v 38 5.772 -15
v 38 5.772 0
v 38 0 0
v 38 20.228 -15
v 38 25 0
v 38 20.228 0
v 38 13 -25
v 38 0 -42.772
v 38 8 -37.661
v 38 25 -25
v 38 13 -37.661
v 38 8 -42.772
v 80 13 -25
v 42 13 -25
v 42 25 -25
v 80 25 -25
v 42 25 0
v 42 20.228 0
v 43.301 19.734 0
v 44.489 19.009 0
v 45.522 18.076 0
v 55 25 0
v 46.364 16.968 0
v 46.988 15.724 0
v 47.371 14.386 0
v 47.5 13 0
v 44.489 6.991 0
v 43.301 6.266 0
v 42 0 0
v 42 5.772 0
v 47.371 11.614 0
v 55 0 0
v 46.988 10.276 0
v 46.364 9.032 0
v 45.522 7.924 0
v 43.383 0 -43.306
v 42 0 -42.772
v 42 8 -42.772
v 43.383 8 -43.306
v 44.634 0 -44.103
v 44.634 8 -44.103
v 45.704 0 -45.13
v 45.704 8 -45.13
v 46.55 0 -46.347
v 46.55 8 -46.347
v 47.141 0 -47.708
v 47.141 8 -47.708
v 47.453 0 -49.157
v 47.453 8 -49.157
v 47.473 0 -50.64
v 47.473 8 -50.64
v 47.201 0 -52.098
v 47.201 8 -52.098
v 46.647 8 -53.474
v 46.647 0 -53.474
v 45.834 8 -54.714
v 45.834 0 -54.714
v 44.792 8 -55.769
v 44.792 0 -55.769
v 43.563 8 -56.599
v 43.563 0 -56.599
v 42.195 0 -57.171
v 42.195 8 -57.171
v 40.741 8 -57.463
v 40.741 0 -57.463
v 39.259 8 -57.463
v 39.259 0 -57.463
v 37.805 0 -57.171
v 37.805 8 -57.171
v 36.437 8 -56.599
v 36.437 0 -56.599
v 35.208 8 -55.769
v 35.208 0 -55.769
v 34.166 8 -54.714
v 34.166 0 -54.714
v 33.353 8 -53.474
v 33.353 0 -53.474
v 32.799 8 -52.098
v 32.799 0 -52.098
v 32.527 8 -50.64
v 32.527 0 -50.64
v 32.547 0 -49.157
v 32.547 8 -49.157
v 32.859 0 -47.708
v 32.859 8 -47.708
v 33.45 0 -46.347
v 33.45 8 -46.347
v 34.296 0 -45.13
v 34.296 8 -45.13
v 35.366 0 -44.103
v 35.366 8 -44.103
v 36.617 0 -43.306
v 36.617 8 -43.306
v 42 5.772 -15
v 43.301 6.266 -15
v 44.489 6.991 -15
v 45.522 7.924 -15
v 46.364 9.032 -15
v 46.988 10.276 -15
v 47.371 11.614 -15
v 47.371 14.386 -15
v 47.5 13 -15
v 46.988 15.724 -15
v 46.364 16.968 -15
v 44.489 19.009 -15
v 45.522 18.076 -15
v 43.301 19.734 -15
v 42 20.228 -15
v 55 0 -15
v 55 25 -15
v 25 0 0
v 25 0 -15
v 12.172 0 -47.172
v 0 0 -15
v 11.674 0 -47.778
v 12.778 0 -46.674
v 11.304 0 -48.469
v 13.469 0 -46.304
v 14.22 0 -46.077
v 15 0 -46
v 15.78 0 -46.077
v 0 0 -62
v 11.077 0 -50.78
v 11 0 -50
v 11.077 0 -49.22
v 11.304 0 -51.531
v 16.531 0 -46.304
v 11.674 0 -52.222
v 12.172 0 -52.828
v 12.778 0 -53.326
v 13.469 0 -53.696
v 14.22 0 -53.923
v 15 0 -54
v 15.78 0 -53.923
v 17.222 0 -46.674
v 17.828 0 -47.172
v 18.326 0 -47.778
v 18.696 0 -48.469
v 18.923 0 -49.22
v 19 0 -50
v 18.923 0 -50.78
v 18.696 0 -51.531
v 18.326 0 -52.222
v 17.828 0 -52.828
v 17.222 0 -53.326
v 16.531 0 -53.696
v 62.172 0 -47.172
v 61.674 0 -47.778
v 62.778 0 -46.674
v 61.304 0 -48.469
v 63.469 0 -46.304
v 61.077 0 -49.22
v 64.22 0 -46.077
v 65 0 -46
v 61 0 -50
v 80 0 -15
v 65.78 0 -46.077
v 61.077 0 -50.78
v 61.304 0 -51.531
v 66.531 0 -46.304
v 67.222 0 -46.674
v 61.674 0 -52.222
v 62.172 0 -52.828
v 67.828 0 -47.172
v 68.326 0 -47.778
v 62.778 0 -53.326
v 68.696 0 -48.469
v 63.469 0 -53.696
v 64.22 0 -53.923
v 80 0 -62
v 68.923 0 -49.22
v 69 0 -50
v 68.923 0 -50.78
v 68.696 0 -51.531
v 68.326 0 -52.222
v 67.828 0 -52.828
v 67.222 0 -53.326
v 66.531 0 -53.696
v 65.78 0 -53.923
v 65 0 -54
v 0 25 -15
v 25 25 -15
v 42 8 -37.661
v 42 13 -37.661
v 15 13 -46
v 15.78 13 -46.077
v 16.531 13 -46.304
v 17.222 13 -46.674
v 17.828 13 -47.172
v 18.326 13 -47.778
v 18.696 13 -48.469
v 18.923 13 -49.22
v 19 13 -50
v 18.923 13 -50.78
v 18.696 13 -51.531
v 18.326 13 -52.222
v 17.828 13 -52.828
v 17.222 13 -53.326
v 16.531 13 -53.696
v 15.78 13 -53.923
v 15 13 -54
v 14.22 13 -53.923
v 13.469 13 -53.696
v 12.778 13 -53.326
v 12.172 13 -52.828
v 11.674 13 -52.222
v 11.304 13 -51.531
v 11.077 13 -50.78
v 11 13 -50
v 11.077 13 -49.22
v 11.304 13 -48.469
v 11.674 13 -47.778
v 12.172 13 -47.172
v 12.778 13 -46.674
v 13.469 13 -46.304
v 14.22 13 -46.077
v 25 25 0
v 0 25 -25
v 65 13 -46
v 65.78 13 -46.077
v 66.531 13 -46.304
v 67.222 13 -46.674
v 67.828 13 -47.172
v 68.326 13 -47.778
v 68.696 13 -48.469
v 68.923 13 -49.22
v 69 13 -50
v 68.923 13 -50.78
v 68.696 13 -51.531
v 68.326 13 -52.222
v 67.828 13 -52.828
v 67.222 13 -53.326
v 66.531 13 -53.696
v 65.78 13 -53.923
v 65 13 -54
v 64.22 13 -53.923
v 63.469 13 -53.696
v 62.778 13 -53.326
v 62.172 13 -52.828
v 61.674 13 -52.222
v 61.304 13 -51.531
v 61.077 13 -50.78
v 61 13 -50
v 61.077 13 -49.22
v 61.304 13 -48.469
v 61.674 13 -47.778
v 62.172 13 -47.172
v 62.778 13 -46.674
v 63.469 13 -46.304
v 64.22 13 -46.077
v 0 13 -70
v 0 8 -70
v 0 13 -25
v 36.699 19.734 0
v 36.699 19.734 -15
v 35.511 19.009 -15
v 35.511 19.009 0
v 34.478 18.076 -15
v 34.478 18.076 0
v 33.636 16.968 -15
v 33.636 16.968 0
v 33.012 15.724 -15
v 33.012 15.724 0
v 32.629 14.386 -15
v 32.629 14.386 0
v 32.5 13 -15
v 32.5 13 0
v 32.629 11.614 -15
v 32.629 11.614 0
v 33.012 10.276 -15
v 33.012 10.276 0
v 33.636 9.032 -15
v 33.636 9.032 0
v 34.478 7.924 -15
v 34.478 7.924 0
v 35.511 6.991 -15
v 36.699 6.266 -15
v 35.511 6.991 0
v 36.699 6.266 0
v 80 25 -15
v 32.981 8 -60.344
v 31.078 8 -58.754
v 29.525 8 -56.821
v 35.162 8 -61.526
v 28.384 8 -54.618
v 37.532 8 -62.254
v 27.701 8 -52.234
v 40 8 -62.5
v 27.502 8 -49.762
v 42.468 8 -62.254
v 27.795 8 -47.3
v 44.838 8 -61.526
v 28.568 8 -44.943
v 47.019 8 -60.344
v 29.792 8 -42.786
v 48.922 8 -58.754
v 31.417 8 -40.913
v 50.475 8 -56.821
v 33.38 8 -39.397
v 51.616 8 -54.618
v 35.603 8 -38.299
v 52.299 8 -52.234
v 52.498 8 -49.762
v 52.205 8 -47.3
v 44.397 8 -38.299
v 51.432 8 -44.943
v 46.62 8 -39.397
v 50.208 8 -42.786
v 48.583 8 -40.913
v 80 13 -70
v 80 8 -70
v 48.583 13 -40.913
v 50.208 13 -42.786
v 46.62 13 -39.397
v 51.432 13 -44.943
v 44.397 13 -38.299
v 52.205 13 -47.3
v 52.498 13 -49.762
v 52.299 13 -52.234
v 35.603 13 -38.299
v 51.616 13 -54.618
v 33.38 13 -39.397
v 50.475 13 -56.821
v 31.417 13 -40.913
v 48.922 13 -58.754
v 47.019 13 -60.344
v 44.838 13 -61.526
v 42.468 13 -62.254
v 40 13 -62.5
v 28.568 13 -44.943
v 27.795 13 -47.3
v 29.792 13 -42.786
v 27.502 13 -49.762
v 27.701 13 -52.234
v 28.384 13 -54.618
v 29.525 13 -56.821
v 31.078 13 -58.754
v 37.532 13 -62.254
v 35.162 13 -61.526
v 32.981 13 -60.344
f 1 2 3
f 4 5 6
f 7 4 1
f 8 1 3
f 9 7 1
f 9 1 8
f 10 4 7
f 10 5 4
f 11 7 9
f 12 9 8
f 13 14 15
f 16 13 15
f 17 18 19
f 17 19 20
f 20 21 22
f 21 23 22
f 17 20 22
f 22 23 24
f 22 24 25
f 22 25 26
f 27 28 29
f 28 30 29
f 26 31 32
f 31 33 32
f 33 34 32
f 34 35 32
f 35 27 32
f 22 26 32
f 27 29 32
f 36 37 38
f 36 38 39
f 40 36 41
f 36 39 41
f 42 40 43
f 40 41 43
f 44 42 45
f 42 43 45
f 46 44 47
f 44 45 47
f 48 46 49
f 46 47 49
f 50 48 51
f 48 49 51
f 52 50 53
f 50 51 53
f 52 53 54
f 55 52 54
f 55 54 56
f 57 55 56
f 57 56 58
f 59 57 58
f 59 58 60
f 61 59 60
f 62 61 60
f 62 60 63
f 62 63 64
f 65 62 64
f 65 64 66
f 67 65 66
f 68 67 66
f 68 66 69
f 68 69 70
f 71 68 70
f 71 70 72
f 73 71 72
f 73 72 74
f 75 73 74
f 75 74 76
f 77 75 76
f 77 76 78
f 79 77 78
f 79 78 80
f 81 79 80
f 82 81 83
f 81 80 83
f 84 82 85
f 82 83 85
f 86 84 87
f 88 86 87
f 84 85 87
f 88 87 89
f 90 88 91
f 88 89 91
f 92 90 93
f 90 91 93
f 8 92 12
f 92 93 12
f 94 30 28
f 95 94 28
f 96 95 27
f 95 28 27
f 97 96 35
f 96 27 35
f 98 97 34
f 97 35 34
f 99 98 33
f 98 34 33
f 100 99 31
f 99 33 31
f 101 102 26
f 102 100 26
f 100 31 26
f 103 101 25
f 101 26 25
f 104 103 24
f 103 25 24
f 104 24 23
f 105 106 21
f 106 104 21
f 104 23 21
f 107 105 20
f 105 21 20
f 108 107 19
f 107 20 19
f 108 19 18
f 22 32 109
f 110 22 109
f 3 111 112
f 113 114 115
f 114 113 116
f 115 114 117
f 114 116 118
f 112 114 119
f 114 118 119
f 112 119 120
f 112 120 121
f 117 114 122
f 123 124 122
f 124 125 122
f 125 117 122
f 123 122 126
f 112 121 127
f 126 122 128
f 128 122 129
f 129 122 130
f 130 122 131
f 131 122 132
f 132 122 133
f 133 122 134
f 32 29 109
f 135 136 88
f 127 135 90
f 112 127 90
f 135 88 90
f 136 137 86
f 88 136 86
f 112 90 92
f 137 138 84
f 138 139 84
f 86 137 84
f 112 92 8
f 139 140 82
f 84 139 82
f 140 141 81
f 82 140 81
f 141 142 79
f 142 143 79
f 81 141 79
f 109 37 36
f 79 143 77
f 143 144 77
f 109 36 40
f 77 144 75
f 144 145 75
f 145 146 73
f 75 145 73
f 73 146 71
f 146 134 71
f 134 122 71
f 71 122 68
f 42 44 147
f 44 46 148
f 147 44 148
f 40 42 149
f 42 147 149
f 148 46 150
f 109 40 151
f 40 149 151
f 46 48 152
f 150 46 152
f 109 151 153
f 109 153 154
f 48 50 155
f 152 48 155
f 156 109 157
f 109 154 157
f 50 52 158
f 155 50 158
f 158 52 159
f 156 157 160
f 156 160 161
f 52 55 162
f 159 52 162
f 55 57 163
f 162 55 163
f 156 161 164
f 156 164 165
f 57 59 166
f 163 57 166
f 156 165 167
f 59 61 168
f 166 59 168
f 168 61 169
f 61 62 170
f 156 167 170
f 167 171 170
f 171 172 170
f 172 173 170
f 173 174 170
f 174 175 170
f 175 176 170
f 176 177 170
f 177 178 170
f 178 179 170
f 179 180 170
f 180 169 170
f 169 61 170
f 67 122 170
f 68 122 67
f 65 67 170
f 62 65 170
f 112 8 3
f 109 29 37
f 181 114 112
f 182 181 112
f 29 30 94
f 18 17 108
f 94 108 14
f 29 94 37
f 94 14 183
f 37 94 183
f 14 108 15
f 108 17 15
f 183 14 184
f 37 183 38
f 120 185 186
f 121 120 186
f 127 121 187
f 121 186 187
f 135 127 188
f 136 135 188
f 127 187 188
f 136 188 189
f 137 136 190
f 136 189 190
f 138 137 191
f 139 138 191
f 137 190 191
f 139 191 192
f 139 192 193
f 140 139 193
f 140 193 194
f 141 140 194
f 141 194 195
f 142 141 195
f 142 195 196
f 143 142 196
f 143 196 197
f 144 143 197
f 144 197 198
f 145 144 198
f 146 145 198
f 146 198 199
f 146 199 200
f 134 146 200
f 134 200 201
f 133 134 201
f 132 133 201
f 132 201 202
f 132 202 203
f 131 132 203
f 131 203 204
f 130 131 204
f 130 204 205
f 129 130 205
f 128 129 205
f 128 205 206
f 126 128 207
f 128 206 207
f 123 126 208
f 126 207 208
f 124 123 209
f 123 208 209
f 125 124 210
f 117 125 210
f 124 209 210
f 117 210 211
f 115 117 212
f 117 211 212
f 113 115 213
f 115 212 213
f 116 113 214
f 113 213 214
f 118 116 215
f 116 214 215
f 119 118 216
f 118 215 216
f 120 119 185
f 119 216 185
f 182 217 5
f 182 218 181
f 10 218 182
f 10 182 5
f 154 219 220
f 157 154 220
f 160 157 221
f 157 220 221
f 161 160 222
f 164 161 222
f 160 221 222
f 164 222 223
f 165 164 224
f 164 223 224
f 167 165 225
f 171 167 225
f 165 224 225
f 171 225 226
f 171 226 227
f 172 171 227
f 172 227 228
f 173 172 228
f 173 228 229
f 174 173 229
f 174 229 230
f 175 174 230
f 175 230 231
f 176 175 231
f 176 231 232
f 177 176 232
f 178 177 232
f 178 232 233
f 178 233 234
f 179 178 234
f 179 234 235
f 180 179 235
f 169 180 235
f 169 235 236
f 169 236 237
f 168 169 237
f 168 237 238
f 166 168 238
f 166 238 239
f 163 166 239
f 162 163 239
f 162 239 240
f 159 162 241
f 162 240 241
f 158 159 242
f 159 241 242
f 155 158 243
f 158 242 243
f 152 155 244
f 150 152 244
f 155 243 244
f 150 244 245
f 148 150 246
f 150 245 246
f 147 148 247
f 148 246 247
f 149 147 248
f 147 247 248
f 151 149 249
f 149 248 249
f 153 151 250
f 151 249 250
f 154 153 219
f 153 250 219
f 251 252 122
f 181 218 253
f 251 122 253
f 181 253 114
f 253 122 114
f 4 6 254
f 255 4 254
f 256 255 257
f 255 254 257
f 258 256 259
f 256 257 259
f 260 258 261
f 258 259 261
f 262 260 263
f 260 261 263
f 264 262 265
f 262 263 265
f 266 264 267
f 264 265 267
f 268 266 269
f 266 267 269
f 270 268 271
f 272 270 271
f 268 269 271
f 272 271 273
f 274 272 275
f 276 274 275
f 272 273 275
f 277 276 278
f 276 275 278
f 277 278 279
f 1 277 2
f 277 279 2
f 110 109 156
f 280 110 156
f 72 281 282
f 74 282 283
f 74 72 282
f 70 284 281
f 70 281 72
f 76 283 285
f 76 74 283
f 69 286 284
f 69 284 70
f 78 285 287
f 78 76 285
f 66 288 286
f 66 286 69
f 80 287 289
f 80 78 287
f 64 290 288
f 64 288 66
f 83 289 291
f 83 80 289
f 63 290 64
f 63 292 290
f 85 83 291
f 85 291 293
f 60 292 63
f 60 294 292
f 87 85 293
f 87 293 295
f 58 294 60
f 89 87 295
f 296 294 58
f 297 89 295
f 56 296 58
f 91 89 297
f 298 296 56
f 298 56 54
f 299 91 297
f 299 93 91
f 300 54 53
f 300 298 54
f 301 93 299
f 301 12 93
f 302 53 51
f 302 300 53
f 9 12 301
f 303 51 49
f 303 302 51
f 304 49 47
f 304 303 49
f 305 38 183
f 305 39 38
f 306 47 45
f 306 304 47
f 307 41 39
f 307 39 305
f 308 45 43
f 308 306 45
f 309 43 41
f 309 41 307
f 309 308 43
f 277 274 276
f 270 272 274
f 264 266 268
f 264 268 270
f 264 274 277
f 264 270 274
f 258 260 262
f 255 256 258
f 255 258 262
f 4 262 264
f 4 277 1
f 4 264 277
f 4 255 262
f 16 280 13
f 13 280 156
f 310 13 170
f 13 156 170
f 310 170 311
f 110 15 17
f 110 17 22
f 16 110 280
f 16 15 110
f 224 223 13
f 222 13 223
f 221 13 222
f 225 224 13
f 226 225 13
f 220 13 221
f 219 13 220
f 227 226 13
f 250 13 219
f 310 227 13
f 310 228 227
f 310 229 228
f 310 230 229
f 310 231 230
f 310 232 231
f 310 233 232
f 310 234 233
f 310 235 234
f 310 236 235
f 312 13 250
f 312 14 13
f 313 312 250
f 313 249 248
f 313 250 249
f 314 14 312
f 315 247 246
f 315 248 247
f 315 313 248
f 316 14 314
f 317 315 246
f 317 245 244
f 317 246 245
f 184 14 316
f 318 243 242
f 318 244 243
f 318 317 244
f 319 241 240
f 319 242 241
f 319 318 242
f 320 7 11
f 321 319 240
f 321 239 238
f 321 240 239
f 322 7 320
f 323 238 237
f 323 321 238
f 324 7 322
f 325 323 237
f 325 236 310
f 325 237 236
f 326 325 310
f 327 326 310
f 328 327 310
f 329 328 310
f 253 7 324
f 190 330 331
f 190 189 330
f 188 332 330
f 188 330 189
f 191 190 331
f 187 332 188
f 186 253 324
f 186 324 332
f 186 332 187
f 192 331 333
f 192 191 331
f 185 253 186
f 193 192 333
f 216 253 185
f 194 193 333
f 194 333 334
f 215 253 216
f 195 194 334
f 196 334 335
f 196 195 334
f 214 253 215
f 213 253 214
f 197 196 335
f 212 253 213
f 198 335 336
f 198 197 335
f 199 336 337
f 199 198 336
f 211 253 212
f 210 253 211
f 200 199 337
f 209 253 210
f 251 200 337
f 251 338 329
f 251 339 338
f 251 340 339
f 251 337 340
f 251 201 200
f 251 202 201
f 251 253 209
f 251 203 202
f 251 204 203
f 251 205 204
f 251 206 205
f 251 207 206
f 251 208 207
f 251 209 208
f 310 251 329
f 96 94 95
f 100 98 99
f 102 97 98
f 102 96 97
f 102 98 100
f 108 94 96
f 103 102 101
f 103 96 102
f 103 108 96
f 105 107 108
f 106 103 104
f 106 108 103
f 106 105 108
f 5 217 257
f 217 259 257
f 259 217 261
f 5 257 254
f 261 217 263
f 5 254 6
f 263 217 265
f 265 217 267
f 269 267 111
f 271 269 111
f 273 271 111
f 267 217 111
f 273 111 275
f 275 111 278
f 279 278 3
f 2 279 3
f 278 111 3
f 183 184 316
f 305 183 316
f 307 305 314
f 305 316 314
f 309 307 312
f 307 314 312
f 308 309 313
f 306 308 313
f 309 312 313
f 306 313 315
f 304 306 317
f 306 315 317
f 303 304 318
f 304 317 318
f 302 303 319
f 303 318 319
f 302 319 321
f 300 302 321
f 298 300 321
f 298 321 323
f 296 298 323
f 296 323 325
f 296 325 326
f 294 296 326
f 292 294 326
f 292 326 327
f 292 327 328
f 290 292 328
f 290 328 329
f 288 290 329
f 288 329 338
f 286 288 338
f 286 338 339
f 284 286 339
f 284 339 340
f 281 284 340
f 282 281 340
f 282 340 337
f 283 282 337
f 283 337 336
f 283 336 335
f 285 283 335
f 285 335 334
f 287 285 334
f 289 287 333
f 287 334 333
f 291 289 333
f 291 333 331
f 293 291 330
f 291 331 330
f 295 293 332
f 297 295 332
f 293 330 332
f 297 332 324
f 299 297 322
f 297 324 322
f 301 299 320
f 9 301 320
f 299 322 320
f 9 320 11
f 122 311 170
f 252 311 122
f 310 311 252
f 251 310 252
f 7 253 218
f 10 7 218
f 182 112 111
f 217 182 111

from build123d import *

# Parameters (mm, degrees)
BOSS_EXTRUDE1_DEPTH     = 25
CUT_EXTRUDE2_DEPTH      = 110.201648339
CUT_EXTRUDE2_DEPTH_BACK = 110.201648339
SKETCH2_W               = 45
SKETCH2_H               = 12
CHAMFER1_SIZE           = 8
SKETCH3_R               = 7.5
SKETCH3_R_2             = 4
CUT_EXTRUDE3_DEPTH      = 25
SKETCH4_R               = 12.5
CUT_EXTRUDE4_DEPTH      = 5
SKETCH5_W               = 4
SKETCH5_H               = 52.762109512
CUT_EXTRUDE5_DEPTH      = 110.201648339
SKETCH6_R               = 7.5
CUT_EXTRUDE6_DEPTH      = 15


with BuildPart() as part:
    # Sketch1 → Boss-Extrude1 (new body)
    with BuildSketch(Plane(origin=(0, 0, 0), x_dir=(1, 0, 0), z_dir=(0, 1, 0))):
        Polygon((25, 0), (55, 0), (55, 15), (80, 15), (80, 70), (0, 70), (0, 15), (25, 15), align=None)
    extrude(amount=BOSS_EXTRUDE1_DEPTH)

    # Sketch2 → Cut-Extrude2 (cut, two sides: drawn at the far end of the back side and taken through both)
    with BuildSketch(Plane(origin=(0, 0, 0), x_dir=(0, 0, -1), z_dir=(1, 0, 0)).offset(-CUT_EXTRUDE2_DEPTH_BACK)):
        with Locations((47.5, 19)):
            Rectangle(SKETCH2_W, SKETCH2_H)
    extrude(amount=CUT_EXTRUDE2_DEPTH + CUT_EXTRUDE2_DEPTH_BACK, mode=Mode.SUBTRACT)

    # Chamfer1
    chamfer1_edges = [part.edges().sort_by_distance(p)[0] for p in [
        (40, 0, -70),
    ]]
    chamfer(chamfer1_edges, length=CHAMFER1_SIZE)

    # Sketch3 → Cut-Extrude3 (cut)
    with BuildSketch(Plane(origin=(0, 13, 0), x_dir=(1, 0, 0), z_dir=(0, 1, 0))):
        with Locations(Location((40, 50, 0), (0, 0, 270))):
            Circle(SKETCH3_R)
        with Locations(Location((65, 50, 0), (0, 0, 270))):
            Circle(SKETCH3_R_2)
        with Locations(Location((15, 50, 0), (0, 0, 270))):
            Circle(SKETCH3_R_2)
    extrude(amount=-CUT_EXTRUDE3_DEPTH, mode=Mode.SUBTRACT)

    # Sketch4 → Cut-Extrude4 (cut)
    with BuildSketch(Plane(origin=(0, 13, 0), x_dir=(1, 0, 0), z_dir=(0, 1, 0))):
        with Locations(Location((40, 50, 0), (0, 0, 270))):
            Circle(SKETCH4_R)
    extrude(amount=-CUT_EXTRUDE4_DEPTH, mode=Mode.SUBTRACT)

    # Sketch5 → Cut-Extrude5 (cut, through all)
    with BuildSketch(Plane(origin=(0, 25, 0), x_dir=(1, 0, 0), z_dir=(0, 1, 0))):
        with Locations((40, 25.178276377)):
            Rectangle(SKETCH5_W, SKETCH5_H)
    extrude(amount=-CUT_EXTRUDE5_DEPTH, mode=Mode.SUBTRACT)

    # Sketch6 → Cut-Extrude6 (cut)
    with BuildSketch(Plane.XY):
        with Locations((40, 13)):
            Circle(SKETCH6_R)
    extrude(amount=-CUT_EXTRUDE6_DEPTH, mode=Mode.SUBTRACT)


solid = part.part
